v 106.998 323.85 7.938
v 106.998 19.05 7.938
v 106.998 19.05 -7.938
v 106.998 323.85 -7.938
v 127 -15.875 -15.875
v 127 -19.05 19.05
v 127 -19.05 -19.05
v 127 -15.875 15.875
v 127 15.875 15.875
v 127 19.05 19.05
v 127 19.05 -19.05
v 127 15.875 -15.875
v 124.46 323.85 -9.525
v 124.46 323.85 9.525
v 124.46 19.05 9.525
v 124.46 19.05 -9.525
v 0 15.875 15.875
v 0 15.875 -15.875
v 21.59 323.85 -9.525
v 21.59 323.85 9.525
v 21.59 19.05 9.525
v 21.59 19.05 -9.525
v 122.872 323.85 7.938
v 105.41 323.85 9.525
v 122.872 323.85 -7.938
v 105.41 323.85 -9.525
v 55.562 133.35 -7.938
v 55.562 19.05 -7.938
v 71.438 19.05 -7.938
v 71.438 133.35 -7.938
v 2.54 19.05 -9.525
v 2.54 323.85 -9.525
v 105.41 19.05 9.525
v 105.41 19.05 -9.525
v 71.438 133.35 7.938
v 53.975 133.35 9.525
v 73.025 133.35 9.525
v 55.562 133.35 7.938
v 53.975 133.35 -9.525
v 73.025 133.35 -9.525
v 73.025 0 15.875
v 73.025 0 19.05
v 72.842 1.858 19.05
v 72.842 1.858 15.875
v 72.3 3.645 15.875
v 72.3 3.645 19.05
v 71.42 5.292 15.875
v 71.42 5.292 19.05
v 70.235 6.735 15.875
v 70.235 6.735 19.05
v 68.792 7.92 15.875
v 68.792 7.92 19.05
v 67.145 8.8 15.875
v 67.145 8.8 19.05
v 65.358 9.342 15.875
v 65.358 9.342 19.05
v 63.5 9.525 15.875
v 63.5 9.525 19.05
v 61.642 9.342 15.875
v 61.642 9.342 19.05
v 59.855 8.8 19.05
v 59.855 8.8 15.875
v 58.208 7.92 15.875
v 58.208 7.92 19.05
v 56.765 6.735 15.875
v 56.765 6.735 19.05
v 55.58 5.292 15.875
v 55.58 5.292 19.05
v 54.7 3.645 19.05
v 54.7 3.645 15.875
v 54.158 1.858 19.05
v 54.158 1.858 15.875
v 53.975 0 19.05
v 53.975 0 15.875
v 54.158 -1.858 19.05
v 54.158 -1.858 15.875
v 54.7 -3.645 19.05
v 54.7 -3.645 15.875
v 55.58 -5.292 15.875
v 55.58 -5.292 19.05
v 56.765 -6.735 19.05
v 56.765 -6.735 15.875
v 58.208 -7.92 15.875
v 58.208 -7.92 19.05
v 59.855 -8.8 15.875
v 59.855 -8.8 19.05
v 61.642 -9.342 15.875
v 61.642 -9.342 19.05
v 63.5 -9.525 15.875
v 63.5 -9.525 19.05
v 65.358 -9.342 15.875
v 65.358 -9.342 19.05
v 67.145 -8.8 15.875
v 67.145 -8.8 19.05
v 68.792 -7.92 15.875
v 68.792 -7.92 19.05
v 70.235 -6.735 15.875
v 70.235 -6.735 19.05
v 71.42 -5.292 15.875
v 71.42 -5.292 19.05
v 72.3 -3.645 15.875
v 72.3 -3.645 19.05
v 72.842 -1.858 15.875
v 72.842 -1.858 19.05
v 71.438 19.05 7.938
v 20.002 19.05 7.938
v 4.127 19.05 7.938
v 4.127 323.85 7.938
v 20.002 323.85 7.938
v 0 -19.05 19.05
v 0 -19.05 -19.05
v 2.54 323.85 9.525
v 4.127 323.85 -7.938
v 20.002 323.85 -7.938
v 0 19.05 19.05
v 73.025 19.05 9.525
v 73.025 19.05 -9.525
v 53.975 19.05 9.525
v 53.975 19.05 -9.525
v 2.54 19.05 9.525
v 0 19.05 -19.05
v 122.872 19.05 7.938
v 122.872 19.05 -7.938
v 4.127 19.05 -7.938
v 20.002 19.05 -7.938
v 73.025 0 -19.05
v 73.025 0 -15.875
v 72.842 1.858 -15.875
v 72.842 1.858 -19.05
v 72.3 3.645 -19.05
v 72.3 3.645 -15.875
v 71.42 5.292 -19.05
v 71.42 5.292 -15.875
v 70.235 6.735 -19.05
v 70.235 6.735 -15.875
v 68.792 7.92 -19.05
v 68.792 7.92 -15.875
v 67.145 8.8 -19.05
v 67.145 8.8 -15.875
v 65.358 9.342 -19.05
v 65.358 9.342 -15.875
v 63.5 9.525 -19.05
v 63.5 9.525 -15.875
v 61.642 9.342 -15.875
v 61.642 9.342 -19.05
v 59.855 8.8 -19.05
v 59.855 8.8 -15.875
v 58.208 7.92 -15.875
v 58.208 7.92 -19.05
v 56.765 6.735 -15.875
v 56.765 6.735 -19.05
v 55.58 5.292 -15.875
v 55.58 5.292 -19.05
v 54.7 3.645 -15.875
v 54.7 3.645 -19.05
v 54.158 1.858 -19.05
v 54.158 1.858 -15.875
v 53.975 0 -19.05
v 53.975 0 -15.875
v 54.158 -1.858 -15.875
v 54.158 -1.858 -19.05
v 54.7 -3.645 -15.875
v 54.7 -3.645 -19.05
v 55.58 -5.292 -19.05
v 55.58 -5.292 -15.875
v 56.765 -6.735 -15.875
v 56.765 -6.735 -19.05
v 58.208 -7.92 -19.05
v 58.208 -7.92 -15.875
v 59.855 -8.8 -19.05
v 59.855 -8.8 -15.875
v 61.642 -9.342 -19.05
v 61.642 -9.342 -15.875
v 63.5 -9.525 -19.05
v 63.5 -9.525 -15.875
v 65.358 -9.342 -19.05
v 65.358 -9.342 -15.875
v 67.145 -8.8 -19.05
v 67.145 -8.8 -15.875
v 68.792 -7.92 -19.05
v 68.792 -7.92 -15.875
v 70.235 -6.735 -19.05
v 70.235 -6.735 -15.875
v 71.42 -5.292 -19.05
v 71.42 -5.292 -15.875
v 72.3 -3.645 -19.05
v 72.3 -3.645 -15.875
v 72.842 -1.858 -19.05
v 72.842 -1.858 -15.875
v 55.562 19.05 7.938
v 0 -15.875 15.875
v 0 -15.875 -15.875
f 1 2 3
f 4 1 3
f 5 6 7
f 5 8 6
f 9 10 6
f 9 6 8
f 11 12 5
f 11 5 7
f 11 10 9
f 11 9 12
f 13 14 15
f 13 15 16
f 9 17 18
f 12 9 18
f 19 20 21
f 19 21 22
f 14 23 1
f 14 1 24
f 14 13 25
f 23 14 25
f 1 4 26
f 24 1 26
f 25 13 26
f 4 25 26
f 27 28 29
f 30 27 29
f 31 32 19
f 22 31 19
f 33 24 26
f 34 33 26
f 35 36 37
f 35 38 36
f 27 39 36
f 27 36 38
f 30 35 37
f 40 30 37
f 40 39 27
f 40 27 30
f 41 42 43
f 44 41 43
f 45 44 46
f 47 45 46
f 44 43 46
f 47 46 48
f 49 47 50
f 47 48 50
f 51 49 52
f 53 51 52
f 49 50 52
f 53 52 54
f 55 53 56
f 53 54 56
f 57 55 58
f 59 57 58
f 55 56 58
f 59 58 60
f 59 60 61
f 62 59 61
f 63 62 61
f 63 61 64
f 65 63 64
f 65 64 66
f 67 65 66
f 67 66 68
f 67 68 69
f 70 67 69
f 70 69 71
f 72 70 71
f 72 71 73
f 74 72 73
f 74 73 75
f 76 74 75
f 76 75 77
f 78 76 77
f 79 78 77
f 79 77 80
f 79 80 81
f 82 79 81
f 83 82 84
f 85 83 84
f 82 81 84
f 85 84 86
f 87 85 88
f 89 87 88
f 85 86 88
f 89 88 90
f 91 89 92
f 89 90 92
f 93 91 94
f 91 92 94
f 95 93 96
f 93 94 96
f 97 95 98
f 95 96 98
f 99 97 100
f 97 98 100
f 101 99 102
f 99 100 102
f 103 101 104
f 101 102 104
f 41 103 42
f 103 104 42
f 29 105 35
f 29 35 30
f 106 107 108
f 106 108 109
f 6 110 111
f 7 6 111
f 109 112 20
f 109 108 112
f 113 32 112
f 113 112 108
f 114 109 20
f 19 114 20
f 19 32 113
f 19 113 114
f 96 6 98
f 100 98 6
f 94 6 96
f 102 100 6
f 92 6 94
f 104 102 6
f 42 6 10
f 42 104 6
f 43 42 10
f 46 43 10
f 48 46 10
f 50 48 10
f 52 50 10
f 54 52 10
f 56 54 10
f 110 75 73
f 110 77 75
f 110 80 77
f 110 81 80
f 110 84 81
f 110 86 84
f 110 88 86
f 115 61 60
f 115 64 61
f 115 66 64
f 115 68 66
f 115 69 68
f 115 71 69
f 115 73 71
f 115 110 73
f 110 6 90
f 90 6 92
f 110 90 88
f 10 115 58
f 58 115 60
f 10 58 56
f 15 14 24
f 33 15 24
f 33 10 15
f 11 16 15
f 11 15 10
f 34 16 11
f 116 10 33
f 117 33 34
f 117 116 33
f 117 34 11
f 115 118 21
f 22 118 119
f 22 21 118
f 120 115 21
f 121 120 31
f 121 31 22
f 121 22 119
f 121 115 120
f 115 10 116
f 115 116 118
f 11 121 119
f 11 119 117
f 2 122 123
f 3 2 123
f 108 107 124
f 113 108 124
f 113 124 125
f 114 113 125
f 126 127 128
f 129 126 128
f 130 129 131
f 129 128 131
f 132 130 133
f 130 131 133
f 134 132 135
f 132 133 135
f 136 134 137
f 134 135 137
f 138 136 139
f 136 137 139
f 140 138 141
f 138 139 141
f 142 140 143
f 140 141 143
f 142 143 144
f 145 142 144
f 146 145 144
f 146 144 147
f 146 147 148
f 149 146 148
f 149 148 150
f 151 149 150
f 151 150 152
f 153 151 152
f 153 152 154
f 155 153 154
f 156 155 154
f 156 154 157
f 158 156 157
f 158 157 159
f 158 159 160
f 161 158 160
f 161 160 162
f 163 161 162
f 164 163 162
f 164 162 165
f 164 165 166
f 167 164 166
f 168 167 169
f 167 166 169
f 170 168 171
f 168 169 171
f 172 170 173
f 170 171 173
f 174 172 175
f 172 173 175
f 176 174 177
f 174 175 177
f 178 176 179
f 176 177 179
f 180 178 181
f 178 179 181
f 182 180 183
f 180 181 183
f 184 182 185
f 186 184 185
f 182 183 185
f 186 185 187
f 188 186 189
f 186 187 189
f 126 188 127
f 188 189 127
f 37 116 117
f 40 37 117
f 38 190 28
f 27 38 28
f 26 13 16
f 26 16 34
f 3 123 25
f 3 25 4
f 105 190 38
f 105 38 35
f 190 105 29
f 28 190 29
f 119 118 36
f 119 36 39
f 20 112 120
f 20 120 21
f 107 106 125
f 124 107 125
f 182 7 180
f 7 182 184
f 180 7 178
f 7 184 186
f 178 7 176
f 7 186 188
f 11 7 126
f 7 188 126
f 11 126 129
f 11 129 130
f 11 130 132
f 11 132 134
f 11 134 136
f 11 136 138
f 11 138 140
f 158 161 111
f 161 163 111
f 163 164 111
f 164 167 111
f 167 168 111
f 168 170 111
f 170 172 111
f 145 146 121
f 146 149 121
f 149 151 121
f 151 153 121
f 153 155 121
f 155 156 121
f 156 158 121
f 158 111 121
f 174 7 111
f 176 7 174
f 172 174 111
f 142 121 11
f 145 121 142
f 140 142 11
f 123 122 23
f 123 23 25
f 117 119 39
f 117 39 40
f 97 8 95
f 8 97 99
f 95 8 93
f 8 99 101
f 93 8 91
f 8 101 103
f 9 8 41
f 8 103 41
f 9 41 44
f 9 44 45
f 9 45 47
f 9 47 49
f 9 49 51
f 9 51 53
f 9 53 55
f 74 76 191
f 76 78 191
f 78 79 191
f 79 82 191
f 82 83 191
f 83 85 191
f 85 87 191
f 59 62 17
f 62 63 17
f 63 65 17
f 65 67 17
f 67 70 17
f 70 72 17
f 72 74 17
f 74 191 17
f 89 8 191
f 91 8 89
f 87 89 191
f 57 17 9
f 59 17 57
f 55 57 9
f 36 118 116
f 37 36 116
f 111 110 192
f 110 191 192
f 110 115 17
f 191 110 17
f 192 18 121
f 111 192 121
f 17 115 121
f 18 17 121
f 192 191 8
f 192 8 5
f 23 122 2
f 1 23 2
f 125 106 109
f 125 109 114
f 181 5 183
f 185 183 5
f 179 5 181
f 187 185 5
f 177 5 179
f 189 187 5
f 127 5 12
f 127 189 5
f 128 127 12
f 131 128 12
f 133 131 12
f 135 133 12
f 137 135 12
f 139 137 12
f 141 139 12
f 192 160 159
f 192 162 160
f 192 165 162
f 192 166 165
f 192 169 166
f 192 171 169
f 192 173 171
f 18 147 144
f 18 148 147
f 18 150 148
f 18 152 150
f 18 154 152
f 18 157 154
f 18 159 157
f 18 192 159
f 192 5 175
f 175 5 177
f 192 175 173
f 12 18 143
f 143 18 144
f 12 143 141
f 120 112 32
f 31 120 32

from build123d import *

# Parameters (mm, degrees)
SKETCH1_W           = 38.1
SKETCH1_H           = 38.1
SKETCH1_W_2         = 31.75
SKETCH1_H_2         = 31.75
BOSS_EXTRUDE1_DEPTH = 127
SKETCH2_W           = 19.05
SKETCH2_H           = 19.05
SKETCH2_W_2         = 15.875
SKETCH2_H_2         = 15.875
BOSS_EXTRUDE2_DEPTH = 114.3
SKETCH3_W           = 19.05
SKETCH3_H           = 19.05
SKETCH3_W_2         = 15.875
SKETCH3_H_2         = 15.875
BOSS_EXTRUDE3_DEPTH = 304.8
SKETCH4_R           = 9.525
CUT_EXTRUDE1_DEPTH  = 350.94204163


with BuildPart() as part:
    # Sketch1 → Boss-Extrude1 (new body)
    with BuildSketch(Plane(origin=(0, 0, 0), x_dir=(0, 0, -1), z_dir=(1, 0, 0))):
        Rectangle(SKETCH1_W, SKETCH1_H)
        Rectangle(SKETCH1_W_2, SKETCH1_H_2, mode=Mode.SUBTRACT)
    extrude(amount=BOSS_EXTRUDE1_DEPTH)

    # Sketch2 → Boss-Extrude2 (add)
    with BuildSketch(Plane(origin=(0, 19.05, 0), x_dir=(1, 0, 0), z_dir=(0, 1, 0))):
        with Locations((63.5, 0)):
            Rectangle(SKETCH2_W, SKETCH2_H)
        with Locations((63.5, 0)):
            Rectangle(SKETCH2_W_2, SKETCH2_H_2, mode=Mode.SUBTRACT)
    extrude(amount=BOSS_EXTRUDE2_DEPTH)

    # Sketch3 → Boss-Extrude3 (add)
    with BuildSketch(Plane(origin=(0, 19.05, 0), x_dir=(1, 0, 0), z_dir=(0, 1, 0))):
        with Locations((12.065, 0)):
            Rectangle(SKETCH3_W, SKETCH3_H)
        with Locations((12.065, 0)):
            Rectangle(SKETCH3_W_2, SKETCH3_H_2, mode=Mode.SUBTRACT)
    boss_extrude3 = extrude(amount=BOSS_EXTRUDE3_DEPTH)

    # Mirror1: Boss-Extrude3 across plane
    add(boss_extrude3.mirror(Plane.ZY.offset(-63.5)))

    # Sketch4 → Cut-Extrude1 (cut, through all)
    with BuildSketch(Plane.XY.offset(19.05)):
        with Locations((63.5, 0)):
            Circle(SKETCH4_R)
    extrude(amount=-CUT_EXTRUDE1_DEPTH, mode=Mode.SUBTRACT)


solid = part.part
